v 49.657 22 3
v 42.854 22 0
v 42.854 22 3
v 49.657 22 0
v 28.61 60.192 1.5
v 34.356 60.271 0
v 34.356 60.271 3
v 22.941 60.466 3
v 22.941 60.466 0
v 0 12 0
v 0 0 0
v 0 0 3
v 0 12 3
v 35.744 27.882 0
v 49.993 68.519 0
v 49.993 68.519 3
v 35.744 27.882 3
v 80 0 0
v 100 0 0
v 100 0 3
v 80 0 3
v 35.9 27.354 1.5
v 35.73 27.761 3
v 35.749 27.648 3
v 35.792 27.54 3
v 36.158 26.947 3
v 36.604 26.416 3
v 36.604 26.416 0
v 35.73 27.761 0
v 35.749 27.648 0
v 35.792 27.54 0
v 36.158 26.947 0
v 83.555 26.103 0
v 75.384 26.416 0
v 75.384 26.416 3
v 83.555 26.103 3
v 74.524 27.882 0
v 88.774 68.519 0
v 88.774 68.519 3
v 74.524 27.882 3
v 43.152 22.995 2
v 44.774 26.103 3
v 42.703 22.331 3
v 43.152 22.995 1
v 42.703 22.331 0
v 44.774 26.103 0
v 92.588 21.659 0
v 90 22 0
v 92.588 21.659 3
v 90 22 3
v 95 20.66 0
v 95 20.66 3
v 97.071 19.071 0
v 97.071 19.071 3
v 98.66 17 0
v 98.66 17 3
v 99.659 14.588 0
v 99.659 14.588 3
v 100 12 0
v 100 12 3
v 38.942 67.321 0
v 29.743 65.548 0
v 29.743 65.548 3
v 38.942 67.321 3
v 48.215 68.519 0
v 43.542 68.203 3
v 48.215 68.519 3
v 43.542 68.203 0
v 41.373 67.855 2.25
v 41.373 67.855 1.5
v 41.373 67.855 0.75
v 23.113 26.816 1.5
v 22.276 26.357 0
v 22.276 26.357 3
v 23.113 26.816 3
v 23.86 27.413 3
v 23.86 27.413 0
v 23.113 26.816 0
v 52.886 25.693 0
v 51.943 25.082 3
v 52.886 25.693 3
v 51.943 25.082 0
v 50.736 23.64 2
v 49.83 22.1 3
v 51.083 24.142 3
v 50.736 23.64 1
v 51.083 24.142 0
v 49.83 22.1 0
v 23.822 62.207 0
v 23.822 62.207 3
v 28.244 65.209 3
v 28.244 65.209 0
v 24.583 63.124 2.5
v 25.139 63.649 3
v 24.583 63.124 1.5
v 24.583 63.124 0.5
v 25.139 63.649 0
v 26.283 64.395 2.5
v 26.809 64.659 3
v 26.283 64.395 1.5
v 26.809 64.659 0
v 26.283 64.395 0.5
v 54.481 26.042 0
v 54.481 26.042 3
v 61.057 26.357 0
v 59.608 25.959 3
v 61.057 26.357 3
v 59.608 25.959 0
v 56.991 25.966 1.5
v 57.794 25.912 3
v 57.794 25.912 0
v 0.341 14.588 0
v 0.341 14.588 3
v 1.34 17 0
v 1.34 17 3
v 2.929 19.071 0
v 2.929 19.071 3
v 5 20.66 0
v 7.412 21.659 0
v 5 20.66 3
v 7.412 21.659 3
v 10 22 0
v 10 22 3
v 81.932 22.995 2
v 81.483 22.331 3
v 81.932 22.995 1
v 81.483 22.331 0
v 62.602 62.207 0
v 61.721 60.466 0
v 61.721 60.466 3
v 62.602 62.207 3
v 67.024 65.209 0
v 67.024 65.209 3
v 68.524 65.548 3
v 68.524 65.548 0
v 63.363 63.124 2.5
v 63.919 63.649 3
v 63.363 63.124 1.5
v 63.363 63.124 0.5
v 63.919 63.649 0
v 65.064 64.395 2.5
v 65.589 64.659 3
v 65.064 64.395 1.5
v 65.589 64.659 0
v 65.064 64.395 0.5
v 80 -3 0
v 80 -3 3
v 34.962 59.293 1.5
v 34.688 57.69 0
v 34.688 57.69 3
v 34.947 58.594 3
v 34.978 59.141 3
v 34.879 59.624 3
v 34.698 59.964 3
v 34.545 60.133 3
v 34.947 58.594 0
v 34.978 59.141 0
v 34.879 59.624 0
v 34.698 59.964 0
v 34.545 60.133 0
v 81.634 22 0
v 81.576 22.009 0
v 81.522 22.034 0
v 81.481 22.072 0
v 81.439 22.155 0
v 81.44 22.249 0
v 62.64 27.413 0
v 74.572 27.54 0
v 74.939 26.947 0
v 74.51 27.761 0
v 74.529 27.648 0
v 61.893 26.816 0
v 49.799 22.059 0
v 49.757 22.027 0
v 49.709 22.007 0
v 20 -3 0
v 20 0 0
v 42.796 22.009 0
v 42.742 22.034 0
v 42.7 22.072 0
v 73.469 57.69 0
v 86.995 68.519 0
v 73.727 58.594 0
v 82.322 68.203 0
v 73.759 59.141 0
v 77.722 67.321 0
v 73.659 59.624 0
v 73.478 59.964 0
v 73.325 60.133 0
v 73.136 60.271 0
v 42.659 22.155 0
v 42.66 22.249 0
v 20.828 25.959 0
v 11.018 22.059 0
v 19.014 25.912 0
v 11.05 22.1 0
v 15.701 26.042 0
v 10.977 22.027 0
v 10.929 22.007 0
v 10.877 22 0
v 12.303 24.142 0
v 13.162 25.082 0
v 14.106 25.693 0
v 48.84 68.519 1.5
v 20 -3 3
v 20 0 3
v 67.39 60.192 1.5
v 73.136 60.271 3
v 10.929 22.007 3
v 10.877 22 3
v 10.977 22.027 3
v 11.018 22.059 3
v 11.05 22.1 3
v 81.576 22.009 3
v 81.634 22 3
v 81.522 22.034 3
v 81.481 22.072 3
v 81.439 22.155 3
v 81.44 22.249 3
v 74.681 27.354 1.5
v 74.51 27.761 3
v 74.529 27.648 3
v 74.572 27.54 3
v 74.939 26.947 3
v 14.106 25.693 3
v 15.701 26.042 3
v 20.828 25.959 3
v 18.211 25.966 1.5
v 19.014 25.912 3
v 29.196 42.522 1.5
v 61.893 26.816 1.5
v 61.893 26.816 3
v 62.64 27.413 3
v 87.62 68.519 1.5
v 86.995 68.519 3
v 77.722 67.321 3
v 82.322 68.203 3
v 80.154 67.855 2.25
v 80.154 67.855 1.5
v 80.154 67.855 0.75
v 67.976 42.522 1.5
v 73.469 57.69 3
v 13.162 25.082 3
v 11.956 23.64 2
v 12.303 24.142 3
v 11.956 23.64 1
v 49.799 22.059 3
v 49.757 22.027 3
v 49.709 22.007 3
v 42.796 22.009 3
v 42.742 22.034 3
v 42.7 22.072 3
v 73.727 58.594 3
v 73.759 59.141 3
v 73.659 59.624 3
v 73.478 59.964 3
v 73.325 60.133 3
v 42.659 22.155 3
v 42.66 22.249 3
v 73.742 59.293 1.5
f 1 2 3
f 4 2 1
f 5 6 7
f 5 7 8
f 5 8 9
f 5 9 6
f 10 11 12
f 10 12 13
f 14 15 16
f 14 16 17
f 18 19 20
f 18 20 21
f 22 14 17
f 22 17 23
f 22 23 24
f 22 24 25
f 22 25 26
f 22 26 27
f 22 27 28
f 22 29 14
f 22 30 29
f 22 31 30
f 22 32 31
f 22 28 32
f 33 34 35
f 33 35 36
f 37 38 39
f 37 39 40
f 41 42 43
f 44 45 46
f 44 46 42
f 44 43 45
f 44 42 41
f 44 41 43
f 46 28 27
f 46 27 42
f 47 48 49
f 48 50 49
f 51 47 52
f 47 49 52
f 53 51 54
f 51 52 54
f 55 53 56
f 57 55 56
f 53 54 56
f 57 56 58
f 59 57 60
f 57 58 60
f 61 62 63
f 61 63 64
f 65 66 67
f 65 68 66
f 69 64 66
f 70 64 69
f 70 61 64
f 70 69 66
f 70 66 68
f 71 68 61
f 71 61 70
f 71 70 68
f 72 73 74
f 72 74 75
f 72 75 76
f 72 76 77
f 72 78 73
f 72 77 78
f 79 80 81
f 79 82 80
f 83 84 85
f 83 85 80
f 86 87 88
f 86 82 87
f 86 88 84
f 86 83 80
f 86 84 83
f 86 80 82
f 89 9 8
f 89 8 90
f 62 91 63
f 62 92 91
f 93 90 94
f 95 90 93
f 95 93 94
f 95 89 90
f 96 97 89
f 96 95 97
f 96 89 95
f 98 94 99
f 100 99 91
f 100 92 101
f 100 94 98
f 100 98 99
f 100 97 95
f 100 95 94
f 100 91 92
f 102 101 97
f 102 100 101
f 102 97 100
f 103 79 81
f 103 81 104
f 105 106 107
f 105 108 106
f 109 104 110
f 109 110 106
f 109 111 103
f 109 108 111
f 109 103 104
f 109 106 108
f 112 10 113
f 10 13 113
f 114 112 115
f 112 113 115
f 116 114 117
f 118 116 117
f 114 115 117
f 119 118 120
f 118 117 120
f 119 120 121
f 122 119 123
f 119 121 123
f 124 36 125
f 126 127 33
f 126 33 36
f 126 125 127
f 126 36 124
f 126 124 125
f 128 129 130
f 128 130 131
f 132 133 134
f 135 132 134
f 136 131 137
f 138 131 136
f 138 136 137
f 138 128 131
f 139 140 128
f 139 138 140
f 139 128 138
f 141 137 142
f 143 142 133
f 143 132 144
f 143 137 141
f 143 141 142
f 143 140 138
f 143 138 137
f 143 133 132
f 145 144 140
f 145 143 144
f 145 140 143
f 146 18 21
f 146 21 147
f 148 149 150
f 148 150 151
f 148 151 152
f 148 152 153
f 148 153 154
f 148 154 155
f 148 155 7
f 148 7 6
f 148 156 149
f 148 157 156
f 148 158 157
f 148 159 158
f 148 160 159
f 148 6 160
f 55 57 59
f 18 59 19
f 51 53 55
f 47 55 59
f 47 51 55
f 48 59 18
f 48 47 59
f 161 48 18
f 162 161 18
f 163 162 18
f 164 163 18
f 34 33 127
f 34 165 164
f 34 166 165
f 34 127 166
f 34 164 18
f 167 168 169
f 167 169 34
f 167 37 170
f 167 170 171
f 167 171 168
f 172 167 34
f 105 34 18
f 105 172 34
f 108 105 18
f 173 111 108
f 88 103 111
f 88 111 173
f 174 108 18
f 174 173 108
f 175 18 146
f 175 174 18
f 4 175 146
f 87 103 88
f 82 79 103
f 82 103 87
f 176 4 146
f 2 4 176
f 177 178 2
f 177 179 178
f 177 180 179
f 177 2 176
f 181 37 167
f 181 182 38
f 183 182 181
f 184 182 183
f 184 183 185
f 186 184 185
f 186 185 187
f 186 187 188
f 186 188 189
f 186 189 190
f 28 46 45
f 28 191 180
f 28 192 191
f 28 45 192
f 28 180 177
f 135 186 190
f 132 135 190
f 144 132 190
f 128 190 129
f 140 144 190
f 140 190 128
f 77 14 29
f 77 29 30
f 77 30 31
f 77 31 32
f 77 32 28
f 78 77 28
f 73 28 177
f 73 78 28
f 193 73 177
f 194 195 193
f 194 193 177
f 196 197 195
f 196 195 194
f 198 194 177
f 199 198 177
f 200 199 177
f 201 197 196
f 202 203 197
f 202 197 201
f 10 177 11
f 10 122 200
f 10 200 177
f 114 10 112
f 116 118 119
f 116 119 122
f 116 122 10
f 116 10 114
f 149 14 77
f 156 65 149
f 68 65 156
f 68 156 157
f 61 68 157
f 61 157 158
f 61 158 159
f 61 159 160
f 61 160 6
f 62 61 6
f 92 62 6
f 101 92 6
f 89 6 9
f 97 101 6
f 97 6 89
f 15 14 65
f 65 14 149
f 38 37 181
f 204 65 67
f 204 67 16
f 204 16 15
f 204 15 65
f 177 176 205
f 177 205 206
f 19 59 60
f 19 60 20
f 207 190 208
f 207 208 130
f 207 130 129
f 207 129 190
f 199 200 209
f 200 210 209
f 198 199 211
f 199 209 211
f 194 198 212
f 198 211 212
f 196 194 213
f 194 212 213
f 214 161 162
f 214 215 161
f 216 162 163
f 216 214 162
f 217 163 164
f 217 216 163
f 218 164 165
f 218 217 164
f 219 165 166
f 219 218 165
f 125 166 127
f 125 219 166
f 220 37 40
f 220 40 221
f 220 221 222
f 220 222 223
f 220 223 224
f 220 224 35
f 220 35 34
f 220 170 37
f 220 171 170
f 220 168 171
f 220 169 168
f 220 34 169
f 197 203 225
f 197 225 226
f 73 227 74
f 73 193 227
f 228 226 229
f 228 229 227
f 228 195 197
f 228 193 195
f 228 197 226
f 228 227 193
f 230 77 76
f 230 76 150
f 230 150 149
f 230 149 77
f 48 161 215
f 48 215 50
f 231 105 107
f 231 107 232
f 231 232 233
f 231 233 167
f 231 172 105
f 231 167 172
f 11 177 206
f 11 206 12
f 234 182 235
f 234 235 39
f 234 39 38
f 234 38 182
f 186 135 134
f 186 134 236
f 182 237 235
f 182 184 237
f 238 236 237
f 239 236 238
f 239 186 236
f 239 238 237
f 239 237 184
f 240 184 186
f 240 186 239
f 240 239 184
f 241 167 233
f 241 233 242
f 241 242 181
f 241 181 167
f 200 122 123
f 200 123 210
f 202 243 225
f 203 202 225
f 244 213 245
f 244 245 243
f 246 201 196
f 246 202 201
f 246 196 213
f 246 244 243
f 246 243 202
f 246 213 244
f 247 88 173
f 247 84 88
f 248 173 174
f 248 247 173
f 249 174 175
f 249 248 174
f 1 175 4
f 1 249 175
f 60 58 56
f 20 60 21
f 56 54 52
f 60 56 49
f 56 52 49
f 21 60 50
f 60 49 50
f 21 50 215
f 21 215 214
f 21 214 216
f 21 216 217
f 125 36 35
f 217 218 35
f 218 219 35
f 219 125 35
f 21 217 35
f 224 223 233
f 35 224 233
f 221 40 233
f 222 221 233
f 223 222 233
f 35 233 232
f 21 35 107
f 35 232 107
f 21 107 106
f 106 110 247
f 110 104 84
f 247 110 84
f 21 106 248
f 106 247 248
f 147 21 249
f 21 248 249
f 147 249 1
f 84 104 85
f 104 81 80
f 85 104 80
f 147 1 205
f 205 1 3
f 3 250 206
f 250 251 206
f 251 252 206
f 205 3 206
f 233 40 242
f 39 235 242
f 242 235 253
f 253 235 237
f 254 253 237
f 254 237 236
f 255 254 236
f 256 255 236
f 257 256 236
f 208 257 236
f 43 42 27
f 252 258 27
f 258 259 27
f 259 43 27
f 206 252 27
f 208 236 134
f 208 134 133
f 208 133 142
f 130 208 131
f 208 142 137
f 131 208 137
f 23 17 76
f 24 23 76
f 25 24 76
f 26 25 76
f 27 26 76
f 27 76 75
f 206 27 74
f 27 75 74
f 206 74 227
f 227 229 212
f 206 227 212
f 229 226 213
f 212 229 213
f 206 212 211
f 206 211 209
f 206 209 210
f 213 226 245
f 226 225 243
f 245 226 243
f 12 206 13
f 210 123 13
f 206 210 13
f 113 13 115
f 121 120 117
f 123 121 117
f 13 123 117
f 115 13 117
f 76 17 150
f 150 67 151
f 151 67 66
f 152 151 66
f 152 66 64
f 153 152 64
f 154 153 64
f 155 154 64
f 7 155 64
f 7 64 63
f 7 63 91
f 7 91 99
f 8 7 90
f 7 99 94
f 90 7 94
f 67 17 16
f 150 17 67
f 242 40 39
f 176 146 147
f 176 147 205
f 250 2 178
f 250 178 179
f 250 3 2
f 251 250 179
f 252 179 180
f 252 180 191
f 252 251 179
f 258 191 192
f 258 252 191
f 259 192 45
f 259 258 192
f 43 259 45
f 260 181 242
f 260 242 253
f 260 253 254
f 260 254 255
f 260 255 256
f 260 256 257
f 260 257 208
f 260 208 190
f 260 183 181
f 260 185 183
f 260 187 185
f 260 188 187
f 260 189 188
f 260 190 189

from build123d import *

# Parameters (mm, degrees)
BOSS_EXTRUDE1_DEPTH = 3
FILLET1_R           = 10
FILLET2_R           = 0.2


with BuildPart() as part:
    # Sketch1 → Boss-Extrude1 (new body)
    with BuildSketch(Plane.XY):
        with BuildLine():
            Line((42.358686368, 22.000000982), (49.772401671, 22.000000982))
            add(Edge.make_bspline(
                [(49.772401671, 22.000000982), (49.840272704, 22.116351885), (50.1551903, 22.666226688), (50.950894785, 24.093636109), (51.94551412, 25.26324692), (52.886288967, 25.69272444)],
                knots=[0.181427978, 0.181427978, 0.181427978, 0.181427978, 0.24891213, 0.498932816, 1, 1, 1, 1], degree=3))
            add(Edge.make_bspline(
                [(52.886288967, 25.69272444), (54.227657261, 26.21198845), (56.978395025, 25.93722039), (59.747728448, 25.781572291), (61.056734627, 26.357306144)],
                knots=[0, 0, 0, 0, 0.501451854, 1, 1, 1, 1], degree=3))
            add(Edge.make_bspline(
                [(61.056734627, 26.357306144), (61.938277564, 26.747818697), (62.640002805, 27.412818263)],
                knots=[0, 0, 0, 1, 1, 1], degree=2))
            add(Edge.make_bspline(
                [(62.640002805, 27.412818263), (64.422298684, 32.447991264), (67.947295887, 42.570792519), (71.63632388, 52.63498927), (73.468775284, 57.690378858)],
                knots=[0, 0, 0, 0, 0.498322561, 1, 1, 1, 1], degree=3))
            add(Edge.make_bspline(
                [(73.468775284, 57.690378858), (73.65195235, 58.18791707), (73.947138477, 59.154492844), (73.494544705, 60.065888317), (73.136484432, 60.270519593)],
                knots=[0, 0, 0, 0, 0.581397084, 1, 1, 1, 1], degree=3))
            add(Edge.make_bspline(
                [(73.136484432, 60.270519593), (71.219763549, 60.304316664), (67.414772669, 60.120408261), (63.601790951, 60.225145139), (61.721316332, 60.4659848)],
                knots=[0, 0, 0, 0, 0.503014916, 1, 1, 1, 1], degree=3))
            add(Edge.make_bspline(
                [(61.721316332, 60.4659848), (61.953278841, 61.133157294), (62.437522451, 62.08211133), (63.355516567, 63.142847502), (64.128800308, 63.865372538), (65.076762001, 64.419081128), (66.503780011, 65.101780751), (67.695837691, 65.416597624), (68.523505542, 65.548080187)],
                knots=[0, 0, 0, 0, 0.237267367, 0.352023708, 0.469658656, 0.590380818, 0.718477308, 1, 1, 1, 1], degree=3))
            add(Edge.make_bspline(
                [(68.523505542, 65.548080187), (71.635771568, 65.94651733), (75.497539161, 66.798521287), (80.119338716, 67.878335493), (83.19923981, 68.360811237), (85.492331103, 68.508361677), (86.994967622, 68.519151336)],
                knots=[0, 0, 0, 0, 0.501477793, 0.632810111, 0.759518477, 1, 1, 1, 1], degree=3))
            add(Edge.make_bspline(
                [(86.994967622, 68.519151336), (87.203463843, 68.519151336), (87.796374971, 68.519151336), (88.3892861, 68.519151336), (88.773701007, 68.519151336)],
                knots=[0, 0, 0, 0, 0.351648352, 1, 1, 1, 1], degree=3))
            Line((88.773701007, 68.519151336), (74.524287403, 27.881934761))
            add(Edge.make_bspline(
                [(74.524287403, 27.881934761), (74.471104748, 27.682138266), (74.802744483, 27.172445206), (75.080434831, 26.689662332), (75.384334314, 26.415945707)],
                knots=[0, 0, 0, 0, 0.324502414, 1, 1, 1, 1], degree=3))
            Line((75.384334314, 26.415945707), (83.554779975, 26.103201375))
            add(Edge.make_bspline(
                [(83.554779975, 26.103201375), (82.959840411, 25.089982249), (82.414680301, 23.767742871), (81.574001976, 22.395101634), (81.262536262, 22.101391942), (81.138983475, 22.000000982)],
                knots=[0, 0, 0, 0, 0.504343167, 0.619768133, 0.688442197, 0.688442197, 0.688442197, 0.688442197], degree=3))
            Line((81.138983475, 22.000000982), (100, 22.000000982))
            Line((100, 22.000000982), (100, 0))
            Line((100, 0), (80, 0))
            Line((80, 0), (80, -3))
            Line((80, -3), (20, -3))
            Line((20, -3), (20, 0))
            Line((20, 0), (0, 0))
            Line((0, 0), (0, 22.000000982))
            Line((0, 22.000000982), (10.992104564, 22.000000982))
            add(Edge.make_bspline(
                [(10.992104564, 22.000000982), (11.059975596, 22.116351885), (11.374893193, 22.666226688), (12.170597678, 24.093636109), (13.165217013, 25.26324692), (14.105991859, 25.69272444)],
                knots=[0.181427978, 0.181427978, 0.181427978, 0.181427978, 0.24891213, 0.498932816, 1, 1, 1, 1], degree=3))
            add(Edge.make_bspline(
                [(14.105991859, 25.69272444), (15.447360154, 26.21198845), (18.198097918, 25.93722039), (20.967431341, 25.781572291), (22.27643752, 26.357306144)],
                knots=[0, 0, 0, 0, 0.501451854, 1, 1, 1, 1], degree=3))
            add(Edge.make_bspline(
                [(22.27643752, 26.357306144), (23.157980457, 26.747818697), (23.859705698, 27.412818263)],
                knots=[0, 0, 0, 1, 1, 1], degree=2))
            add(Edge.make_bspline(
                [(23.859705698, 27.412818263), (25.642001577, 32.447991264), (29.16699878, 42.570792519), (32.856026773, 52.63498927), (34.688478177, 57.690378858)],
                knots=[0, 0, 0, 0, 0.498322561, 1, 1, 1, 1], degree=3))
            add(Edge.make_bspline(
                [(34.688478177, 57.690378858), (34.871655243, 58.18791707), (35.16684137, 59.154492844), (34.714247598, 60.065888317), (34.356187325, 60.270519593)],
                knots=[0, 0, 0, 0, 0.581397084, 1, 1, 1, 1], degree=3))
            add(Edge.make_bspline(
                [(34.356187325, 60.270519593), (32.439466442, 60.304316664), (28.634475562, 60.120408261), (24.821493844, 60.225145139), (22.941019225, 60.4659848)],
                knots=[0, 0, 0, 0, 0.503014916, 1, 1, 1, 1], degree=3))
            add(Edge.make_bspline(
                [(22.941019225, 60.4659848), (23.172981734, 61.133157294), (23.657225344, 62.08211133), (24.57521946, 63.142847502), (25.348503201, 63.865372538), (26.296464893, 64.419081128), (27.723482904, 65.101780751), (28.915540584, 65.416597624), (29.743208435, 65.548080187)],
                knots=[0, 0, 0, 0, 0.237267367, 0.352023708, 0.469658656, 0.590380818, 0.718477308, 1, 1, 1, 1], degree=3))
            add(Edge.make_bspline(
                [(29.743208435, 65.548080187), (32.85547446, 65.94651733), (36.717242054, 66.798521287), (41.339041609, 67.878335493), (44.418942703, 68.360811237), (46.712033996, 68.508361677), (48.214670515, 68.519151336)],
                knots=[0, 0, 0, 0, 0.501477793, 0.632810111, 0.759518477, 1, 1, 1, 1], degree=3))
            add(Edge.make_bspline(
                [(48.214670515, 68.519151336), (48.423166736, 68.519151336), (49.016077864, 68.519151336), (49.608988993, 68.519151336), (49.9934039, 68.519151336)],
                knots=[0, 0, 0, 0, 0.351648352, 1, 1, 1, 1], degree=3))
            Line((49.9934039, 68.519151336), (35.743990296, 27.881934761))
            add(Edge.make_bspline(
                [(35.743990296, 27.881934761), (35.690807641, 27.682138266), (36.022447376, 27.172445206), (36.300137724, 26.689662332), (36.604037207, 26.415945707)],
                knots=[0, 0, 0, 0, 0.324502414, 1, 1, 1, 1], degree=3))
            Line((36.604037207, 26.415945707), (44.774482868, 26.103201375))
            add(Edge.make_bspline(
                [(44.774482868, 26.103201375), (44.179543303, 25.089982249), (43.634383194, 23.767742871), (42.793704869, 22.395101634), (42.482239154, 22.101391942), (42.358686368, 22.000000982)],
                knots=[0, 0, 0, 0, 0.504343167, 0.619768133, 0.688442197, 0.688442197, 0.688442197, 0.688442197], degree=3))
        make_face()
    extrude(amount=BOSS_EXTRUDE1_DEPTH)

    # Fillet1
    fillet1_edges = [part.edges().sort_by_distance(p)[0] for p in [
        (100, 22.000000982, 1.5),
        (0, 22.000000982, 1.5),
    ]]
    fillet(fillet1_edges, radius=FILLET1_R)

    # Fillet2
    fillet2_edges = [part.edges().sort_by_distance(p)[0] for p in [
        (49.772401671, 22.000000982, 1.5),
        (81.138983475, 22.000000982, 1.5),
        (42.358686368, 22.000000982, 1.5),
        (10.992104564, 22.000000982, 1.5),
    ]]
    fillet(fillet2_edges, radius=FILLET2_R)


solid = part.part
